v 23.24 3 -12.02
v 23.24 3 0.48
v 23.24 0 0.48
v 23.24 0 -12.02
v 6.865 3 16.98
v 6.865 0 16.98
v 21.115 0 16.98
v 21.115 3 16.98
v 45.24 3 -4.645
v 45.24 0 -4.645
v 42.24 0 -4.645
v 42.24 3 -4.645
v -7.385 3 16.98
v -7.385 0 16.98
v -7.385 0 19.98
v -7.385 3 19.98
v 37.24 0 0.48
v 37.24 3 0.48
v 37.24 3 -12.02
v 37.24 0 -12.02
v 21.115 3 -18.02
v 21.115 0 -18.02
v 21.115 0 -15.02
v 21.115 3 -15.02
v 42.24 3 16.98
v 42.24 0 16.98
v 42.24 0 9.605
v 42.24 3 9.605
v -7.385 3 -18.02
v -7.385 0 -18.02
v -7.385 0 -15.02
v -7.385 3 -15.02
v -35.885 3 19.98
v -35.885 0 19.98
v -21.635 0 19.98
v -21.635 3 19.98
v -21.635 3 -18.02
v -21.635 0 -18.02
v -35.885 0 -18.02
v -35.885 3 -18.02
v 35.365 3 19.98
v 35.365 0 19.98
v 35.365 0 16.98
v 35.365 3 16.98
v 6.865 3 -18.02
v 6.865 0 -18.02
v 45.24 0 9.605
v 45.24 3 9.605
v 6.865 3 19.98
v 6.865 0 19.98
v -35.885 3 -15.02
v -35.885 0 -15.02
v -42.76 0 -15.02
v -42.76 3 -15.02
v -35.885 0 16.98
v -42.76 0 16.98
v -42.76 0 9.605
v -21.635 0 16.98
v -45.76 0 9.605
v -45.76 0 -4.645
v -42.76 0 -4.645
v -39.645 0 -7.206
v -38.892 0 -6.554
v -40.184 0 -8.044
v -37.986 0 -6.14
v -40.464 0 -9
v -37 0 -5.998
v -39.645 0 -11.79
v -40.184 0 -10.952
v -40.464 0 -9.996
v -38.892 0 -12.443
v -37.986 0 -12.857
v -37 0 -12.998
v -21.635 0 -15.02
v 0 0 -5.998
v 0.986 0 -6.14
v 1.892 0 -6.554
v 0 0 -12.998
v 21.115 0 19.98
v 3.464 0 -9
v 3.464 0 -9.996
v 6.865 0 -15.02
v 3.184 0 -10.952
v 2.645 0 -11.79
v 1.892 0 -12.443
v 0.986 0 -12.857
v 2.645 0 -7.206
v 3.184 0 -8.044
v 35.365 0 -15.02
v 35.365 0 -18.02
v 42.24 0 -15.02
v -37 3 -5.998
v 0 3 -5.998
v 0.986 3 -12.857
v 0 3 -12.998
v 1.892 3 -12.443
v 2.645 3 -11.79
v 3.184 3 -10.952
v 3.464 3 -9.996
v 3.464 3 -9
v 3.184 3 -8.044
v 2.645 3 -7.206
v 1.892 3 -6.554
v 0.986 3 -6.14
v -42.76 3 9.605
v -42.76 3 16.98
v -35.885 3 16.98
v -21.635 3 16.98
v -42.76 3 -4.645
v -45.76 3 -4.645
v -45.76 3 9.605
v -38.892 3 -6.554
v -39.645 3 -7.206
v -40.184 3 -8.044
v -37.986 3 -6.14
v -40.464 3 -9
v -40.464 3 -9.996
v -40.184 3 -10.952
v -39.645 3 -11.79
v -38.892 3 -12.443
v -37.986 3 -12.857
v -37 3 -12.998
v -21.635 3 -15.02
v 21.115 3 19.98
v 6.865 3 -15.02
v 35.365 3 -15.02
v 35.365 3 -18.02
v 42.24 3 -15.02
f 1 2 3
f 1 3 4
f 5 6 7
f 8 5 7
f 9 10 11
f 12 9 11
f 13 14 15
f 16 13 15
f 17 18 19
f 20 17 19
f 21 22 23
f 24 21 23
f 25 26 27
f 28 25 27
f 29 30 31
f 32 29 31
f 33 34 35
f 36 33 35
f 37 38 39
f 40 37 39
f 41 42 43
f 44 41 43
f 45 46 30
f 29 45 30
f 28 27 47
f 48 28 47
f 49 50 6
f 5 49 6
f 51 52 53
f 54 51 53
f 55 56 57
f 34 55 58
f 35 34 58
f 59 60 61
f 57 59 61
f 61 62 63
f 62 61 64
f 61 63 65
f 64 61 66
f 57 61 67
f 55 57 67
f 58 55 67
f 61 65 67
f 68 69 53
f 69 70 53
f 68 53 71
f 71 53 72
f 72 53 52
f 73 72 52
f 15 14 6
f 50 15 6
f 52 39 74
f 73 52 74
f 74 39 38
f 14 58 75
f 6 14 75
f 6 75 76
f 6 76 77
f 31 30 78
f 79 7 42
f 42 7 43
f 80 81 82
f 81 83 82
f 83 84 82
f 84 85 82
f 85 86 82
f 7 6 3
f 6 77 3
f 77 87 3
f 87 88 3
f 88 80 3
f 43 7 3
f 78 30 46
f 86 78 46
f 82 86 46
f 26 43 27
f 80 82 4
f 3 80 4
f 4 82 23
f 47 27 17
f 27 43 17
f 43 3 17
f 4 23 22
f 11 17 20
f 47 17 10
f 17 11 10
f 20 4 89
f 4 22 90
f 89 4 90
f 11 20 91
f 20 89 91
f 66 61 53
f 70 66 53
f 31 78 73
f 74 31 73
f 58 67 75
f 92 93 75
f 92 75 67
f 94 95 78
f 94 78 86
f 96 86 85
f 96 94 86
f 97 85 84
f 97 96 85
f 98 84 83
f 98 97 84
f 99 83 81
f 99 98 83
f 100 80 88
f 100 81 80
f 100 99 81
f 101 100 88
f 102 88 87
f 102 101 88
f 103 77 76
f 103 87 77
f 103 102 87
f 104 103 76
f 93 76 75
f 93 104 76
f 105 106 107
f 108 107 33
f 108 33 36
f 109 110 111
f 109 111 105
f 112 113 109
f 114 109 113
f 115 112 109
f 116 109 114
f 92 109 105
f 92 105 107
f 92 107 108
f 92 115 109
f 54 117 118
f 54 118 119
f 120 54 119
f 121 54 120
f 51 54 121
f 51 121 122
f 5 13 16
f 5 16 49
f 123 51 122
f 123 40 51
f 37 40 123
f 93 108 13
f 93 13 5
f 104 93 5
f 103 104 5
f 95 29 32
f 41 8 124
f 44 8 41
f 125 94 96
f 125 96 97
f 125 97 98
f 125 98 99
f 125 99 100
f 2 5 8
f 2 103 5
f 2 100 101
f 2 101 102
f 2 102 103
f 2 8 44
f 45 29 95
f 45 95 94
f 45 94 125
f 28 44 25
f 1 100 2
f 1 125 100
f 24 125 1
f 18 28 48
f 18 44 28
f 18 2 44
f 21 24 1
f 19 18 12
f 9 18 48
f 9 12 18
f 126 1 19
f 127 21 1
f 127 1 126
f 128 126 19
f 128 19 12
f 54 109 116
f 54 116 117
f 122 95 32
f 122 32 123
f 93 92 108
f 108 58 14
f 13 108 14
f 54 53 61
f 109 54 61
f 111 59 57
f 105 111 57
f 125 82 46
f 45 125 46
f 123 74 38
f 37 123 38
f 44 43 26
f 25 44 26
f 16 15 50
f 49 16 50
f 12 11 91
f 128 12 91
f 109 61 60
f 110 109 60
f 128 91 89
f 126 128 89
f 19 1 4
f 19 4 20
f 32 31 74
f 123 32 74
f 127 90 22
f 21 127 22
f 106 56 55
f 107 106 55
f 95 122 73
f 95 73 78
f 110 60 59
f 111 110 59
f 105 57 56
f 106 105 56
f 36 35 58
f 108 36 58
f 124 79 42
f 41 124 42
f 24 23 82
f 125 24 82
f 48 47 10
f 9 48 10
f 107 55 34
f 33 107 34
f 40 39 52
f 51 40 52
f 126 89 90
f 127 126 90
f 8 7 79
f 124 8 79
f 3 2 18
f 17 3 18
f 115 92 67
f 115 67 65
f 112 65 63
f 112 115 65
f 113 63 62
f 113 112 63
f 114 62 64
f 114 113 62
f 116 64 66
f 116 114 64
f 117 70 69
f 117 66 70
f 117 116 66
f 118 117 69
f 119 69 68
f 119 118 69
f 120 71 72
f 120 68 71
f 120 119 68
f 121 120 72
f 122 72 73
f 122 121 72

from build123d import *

# Parameters (mm, degrees)
BOSS_EXTRUDE1_DEPTH = 3
SKETCH2_W           = 14
SKETCH2_H           = 12.5
CUT_EXTRUDE1_DEPTH  = 10


with BuildPart() as part:
    # Sketch1 → Boss-Extrude1 (new body)
    with BuildSketch(Plane(origin=(0, 0, 0), x_dir=(1, 0, 0), z_dir=(0, 1, 0))):
        Polygon((-42.760092083, 15.020184167), (-42.760092083, 4.645184167), (-45.760092083, 4.645184167), (-45.760092083, -9.604815833), (-42.760092083, -9.604815833), (-42.760092083, -16.979815833), (-35.885092083, -16.979815833), (-35.885092083, -19.979815833), (-21.635092083, -19.979815833), (-21.635092083, -16.979815833), (-7.385092083, -16.979815833), (-7.385092083, -19.979815833), (6.864907917, -19.979815833), (6.864907917, -16.979815833), (21.114907917, -16.979815833), (21.114907917, -19.979815833), (35.364907917, -19.979815833), (35.364907917, -16.979815833), (42.239907917, -16.979815833), (42.239907917, -9.604815833), (45.239907917, -9.604815833), (45.239907917, 4.645184167), (42.239907917, 4.645184167), (42.239907917, 15.020184167), (35.364907917, 15.020184167), (35.364907917, 18.020184167), (21.114907917, 18.020184167), (21.114907917, 15.020184167), (6.864907917, 15.020184167), (6.864907917, 18.020184167), (-7.385092083, 18.020184167), (-7.385092083, 15.020184167), (-21.635092083, 15.020184167), (-21.635092083, 18.020184167), (-35.885092083, 18.020184167), (-35.885092083, 15.020184167), align=None)
    extrude(amount=BOSS_EXTRUDE1_DEPTH)

    # Sketch2 → Cut-Extrude1 (cut)
    with BuildSketch(Plane(origin=(0, 3, 0), x_dir=(1, 0, 0), z_dir=(0, 1, 0))):
        with Locations((30.239907917, 5.770184167)):
            Rectangle(SKETCH2_W, SKETCH2_H)
        with BuildLine():
            Line((-37, 12.998362663), (0, 12.998362663))
            ThreePointArc((0, 12.998362663), (3.5, 9.498362663), (0, 5.998362663))
            Line((0, 5.998362663), (-37, 5.998362663))
            ThreePointArc((-37, 5.998362663), (-40.5, 9.498362663), (-37, 12.998362663))
        make_face()
    extrude(amount=-CUT_EXTRUDE1_DEPTH, mode=Mode.SUBTRACT)


solid = part.part
